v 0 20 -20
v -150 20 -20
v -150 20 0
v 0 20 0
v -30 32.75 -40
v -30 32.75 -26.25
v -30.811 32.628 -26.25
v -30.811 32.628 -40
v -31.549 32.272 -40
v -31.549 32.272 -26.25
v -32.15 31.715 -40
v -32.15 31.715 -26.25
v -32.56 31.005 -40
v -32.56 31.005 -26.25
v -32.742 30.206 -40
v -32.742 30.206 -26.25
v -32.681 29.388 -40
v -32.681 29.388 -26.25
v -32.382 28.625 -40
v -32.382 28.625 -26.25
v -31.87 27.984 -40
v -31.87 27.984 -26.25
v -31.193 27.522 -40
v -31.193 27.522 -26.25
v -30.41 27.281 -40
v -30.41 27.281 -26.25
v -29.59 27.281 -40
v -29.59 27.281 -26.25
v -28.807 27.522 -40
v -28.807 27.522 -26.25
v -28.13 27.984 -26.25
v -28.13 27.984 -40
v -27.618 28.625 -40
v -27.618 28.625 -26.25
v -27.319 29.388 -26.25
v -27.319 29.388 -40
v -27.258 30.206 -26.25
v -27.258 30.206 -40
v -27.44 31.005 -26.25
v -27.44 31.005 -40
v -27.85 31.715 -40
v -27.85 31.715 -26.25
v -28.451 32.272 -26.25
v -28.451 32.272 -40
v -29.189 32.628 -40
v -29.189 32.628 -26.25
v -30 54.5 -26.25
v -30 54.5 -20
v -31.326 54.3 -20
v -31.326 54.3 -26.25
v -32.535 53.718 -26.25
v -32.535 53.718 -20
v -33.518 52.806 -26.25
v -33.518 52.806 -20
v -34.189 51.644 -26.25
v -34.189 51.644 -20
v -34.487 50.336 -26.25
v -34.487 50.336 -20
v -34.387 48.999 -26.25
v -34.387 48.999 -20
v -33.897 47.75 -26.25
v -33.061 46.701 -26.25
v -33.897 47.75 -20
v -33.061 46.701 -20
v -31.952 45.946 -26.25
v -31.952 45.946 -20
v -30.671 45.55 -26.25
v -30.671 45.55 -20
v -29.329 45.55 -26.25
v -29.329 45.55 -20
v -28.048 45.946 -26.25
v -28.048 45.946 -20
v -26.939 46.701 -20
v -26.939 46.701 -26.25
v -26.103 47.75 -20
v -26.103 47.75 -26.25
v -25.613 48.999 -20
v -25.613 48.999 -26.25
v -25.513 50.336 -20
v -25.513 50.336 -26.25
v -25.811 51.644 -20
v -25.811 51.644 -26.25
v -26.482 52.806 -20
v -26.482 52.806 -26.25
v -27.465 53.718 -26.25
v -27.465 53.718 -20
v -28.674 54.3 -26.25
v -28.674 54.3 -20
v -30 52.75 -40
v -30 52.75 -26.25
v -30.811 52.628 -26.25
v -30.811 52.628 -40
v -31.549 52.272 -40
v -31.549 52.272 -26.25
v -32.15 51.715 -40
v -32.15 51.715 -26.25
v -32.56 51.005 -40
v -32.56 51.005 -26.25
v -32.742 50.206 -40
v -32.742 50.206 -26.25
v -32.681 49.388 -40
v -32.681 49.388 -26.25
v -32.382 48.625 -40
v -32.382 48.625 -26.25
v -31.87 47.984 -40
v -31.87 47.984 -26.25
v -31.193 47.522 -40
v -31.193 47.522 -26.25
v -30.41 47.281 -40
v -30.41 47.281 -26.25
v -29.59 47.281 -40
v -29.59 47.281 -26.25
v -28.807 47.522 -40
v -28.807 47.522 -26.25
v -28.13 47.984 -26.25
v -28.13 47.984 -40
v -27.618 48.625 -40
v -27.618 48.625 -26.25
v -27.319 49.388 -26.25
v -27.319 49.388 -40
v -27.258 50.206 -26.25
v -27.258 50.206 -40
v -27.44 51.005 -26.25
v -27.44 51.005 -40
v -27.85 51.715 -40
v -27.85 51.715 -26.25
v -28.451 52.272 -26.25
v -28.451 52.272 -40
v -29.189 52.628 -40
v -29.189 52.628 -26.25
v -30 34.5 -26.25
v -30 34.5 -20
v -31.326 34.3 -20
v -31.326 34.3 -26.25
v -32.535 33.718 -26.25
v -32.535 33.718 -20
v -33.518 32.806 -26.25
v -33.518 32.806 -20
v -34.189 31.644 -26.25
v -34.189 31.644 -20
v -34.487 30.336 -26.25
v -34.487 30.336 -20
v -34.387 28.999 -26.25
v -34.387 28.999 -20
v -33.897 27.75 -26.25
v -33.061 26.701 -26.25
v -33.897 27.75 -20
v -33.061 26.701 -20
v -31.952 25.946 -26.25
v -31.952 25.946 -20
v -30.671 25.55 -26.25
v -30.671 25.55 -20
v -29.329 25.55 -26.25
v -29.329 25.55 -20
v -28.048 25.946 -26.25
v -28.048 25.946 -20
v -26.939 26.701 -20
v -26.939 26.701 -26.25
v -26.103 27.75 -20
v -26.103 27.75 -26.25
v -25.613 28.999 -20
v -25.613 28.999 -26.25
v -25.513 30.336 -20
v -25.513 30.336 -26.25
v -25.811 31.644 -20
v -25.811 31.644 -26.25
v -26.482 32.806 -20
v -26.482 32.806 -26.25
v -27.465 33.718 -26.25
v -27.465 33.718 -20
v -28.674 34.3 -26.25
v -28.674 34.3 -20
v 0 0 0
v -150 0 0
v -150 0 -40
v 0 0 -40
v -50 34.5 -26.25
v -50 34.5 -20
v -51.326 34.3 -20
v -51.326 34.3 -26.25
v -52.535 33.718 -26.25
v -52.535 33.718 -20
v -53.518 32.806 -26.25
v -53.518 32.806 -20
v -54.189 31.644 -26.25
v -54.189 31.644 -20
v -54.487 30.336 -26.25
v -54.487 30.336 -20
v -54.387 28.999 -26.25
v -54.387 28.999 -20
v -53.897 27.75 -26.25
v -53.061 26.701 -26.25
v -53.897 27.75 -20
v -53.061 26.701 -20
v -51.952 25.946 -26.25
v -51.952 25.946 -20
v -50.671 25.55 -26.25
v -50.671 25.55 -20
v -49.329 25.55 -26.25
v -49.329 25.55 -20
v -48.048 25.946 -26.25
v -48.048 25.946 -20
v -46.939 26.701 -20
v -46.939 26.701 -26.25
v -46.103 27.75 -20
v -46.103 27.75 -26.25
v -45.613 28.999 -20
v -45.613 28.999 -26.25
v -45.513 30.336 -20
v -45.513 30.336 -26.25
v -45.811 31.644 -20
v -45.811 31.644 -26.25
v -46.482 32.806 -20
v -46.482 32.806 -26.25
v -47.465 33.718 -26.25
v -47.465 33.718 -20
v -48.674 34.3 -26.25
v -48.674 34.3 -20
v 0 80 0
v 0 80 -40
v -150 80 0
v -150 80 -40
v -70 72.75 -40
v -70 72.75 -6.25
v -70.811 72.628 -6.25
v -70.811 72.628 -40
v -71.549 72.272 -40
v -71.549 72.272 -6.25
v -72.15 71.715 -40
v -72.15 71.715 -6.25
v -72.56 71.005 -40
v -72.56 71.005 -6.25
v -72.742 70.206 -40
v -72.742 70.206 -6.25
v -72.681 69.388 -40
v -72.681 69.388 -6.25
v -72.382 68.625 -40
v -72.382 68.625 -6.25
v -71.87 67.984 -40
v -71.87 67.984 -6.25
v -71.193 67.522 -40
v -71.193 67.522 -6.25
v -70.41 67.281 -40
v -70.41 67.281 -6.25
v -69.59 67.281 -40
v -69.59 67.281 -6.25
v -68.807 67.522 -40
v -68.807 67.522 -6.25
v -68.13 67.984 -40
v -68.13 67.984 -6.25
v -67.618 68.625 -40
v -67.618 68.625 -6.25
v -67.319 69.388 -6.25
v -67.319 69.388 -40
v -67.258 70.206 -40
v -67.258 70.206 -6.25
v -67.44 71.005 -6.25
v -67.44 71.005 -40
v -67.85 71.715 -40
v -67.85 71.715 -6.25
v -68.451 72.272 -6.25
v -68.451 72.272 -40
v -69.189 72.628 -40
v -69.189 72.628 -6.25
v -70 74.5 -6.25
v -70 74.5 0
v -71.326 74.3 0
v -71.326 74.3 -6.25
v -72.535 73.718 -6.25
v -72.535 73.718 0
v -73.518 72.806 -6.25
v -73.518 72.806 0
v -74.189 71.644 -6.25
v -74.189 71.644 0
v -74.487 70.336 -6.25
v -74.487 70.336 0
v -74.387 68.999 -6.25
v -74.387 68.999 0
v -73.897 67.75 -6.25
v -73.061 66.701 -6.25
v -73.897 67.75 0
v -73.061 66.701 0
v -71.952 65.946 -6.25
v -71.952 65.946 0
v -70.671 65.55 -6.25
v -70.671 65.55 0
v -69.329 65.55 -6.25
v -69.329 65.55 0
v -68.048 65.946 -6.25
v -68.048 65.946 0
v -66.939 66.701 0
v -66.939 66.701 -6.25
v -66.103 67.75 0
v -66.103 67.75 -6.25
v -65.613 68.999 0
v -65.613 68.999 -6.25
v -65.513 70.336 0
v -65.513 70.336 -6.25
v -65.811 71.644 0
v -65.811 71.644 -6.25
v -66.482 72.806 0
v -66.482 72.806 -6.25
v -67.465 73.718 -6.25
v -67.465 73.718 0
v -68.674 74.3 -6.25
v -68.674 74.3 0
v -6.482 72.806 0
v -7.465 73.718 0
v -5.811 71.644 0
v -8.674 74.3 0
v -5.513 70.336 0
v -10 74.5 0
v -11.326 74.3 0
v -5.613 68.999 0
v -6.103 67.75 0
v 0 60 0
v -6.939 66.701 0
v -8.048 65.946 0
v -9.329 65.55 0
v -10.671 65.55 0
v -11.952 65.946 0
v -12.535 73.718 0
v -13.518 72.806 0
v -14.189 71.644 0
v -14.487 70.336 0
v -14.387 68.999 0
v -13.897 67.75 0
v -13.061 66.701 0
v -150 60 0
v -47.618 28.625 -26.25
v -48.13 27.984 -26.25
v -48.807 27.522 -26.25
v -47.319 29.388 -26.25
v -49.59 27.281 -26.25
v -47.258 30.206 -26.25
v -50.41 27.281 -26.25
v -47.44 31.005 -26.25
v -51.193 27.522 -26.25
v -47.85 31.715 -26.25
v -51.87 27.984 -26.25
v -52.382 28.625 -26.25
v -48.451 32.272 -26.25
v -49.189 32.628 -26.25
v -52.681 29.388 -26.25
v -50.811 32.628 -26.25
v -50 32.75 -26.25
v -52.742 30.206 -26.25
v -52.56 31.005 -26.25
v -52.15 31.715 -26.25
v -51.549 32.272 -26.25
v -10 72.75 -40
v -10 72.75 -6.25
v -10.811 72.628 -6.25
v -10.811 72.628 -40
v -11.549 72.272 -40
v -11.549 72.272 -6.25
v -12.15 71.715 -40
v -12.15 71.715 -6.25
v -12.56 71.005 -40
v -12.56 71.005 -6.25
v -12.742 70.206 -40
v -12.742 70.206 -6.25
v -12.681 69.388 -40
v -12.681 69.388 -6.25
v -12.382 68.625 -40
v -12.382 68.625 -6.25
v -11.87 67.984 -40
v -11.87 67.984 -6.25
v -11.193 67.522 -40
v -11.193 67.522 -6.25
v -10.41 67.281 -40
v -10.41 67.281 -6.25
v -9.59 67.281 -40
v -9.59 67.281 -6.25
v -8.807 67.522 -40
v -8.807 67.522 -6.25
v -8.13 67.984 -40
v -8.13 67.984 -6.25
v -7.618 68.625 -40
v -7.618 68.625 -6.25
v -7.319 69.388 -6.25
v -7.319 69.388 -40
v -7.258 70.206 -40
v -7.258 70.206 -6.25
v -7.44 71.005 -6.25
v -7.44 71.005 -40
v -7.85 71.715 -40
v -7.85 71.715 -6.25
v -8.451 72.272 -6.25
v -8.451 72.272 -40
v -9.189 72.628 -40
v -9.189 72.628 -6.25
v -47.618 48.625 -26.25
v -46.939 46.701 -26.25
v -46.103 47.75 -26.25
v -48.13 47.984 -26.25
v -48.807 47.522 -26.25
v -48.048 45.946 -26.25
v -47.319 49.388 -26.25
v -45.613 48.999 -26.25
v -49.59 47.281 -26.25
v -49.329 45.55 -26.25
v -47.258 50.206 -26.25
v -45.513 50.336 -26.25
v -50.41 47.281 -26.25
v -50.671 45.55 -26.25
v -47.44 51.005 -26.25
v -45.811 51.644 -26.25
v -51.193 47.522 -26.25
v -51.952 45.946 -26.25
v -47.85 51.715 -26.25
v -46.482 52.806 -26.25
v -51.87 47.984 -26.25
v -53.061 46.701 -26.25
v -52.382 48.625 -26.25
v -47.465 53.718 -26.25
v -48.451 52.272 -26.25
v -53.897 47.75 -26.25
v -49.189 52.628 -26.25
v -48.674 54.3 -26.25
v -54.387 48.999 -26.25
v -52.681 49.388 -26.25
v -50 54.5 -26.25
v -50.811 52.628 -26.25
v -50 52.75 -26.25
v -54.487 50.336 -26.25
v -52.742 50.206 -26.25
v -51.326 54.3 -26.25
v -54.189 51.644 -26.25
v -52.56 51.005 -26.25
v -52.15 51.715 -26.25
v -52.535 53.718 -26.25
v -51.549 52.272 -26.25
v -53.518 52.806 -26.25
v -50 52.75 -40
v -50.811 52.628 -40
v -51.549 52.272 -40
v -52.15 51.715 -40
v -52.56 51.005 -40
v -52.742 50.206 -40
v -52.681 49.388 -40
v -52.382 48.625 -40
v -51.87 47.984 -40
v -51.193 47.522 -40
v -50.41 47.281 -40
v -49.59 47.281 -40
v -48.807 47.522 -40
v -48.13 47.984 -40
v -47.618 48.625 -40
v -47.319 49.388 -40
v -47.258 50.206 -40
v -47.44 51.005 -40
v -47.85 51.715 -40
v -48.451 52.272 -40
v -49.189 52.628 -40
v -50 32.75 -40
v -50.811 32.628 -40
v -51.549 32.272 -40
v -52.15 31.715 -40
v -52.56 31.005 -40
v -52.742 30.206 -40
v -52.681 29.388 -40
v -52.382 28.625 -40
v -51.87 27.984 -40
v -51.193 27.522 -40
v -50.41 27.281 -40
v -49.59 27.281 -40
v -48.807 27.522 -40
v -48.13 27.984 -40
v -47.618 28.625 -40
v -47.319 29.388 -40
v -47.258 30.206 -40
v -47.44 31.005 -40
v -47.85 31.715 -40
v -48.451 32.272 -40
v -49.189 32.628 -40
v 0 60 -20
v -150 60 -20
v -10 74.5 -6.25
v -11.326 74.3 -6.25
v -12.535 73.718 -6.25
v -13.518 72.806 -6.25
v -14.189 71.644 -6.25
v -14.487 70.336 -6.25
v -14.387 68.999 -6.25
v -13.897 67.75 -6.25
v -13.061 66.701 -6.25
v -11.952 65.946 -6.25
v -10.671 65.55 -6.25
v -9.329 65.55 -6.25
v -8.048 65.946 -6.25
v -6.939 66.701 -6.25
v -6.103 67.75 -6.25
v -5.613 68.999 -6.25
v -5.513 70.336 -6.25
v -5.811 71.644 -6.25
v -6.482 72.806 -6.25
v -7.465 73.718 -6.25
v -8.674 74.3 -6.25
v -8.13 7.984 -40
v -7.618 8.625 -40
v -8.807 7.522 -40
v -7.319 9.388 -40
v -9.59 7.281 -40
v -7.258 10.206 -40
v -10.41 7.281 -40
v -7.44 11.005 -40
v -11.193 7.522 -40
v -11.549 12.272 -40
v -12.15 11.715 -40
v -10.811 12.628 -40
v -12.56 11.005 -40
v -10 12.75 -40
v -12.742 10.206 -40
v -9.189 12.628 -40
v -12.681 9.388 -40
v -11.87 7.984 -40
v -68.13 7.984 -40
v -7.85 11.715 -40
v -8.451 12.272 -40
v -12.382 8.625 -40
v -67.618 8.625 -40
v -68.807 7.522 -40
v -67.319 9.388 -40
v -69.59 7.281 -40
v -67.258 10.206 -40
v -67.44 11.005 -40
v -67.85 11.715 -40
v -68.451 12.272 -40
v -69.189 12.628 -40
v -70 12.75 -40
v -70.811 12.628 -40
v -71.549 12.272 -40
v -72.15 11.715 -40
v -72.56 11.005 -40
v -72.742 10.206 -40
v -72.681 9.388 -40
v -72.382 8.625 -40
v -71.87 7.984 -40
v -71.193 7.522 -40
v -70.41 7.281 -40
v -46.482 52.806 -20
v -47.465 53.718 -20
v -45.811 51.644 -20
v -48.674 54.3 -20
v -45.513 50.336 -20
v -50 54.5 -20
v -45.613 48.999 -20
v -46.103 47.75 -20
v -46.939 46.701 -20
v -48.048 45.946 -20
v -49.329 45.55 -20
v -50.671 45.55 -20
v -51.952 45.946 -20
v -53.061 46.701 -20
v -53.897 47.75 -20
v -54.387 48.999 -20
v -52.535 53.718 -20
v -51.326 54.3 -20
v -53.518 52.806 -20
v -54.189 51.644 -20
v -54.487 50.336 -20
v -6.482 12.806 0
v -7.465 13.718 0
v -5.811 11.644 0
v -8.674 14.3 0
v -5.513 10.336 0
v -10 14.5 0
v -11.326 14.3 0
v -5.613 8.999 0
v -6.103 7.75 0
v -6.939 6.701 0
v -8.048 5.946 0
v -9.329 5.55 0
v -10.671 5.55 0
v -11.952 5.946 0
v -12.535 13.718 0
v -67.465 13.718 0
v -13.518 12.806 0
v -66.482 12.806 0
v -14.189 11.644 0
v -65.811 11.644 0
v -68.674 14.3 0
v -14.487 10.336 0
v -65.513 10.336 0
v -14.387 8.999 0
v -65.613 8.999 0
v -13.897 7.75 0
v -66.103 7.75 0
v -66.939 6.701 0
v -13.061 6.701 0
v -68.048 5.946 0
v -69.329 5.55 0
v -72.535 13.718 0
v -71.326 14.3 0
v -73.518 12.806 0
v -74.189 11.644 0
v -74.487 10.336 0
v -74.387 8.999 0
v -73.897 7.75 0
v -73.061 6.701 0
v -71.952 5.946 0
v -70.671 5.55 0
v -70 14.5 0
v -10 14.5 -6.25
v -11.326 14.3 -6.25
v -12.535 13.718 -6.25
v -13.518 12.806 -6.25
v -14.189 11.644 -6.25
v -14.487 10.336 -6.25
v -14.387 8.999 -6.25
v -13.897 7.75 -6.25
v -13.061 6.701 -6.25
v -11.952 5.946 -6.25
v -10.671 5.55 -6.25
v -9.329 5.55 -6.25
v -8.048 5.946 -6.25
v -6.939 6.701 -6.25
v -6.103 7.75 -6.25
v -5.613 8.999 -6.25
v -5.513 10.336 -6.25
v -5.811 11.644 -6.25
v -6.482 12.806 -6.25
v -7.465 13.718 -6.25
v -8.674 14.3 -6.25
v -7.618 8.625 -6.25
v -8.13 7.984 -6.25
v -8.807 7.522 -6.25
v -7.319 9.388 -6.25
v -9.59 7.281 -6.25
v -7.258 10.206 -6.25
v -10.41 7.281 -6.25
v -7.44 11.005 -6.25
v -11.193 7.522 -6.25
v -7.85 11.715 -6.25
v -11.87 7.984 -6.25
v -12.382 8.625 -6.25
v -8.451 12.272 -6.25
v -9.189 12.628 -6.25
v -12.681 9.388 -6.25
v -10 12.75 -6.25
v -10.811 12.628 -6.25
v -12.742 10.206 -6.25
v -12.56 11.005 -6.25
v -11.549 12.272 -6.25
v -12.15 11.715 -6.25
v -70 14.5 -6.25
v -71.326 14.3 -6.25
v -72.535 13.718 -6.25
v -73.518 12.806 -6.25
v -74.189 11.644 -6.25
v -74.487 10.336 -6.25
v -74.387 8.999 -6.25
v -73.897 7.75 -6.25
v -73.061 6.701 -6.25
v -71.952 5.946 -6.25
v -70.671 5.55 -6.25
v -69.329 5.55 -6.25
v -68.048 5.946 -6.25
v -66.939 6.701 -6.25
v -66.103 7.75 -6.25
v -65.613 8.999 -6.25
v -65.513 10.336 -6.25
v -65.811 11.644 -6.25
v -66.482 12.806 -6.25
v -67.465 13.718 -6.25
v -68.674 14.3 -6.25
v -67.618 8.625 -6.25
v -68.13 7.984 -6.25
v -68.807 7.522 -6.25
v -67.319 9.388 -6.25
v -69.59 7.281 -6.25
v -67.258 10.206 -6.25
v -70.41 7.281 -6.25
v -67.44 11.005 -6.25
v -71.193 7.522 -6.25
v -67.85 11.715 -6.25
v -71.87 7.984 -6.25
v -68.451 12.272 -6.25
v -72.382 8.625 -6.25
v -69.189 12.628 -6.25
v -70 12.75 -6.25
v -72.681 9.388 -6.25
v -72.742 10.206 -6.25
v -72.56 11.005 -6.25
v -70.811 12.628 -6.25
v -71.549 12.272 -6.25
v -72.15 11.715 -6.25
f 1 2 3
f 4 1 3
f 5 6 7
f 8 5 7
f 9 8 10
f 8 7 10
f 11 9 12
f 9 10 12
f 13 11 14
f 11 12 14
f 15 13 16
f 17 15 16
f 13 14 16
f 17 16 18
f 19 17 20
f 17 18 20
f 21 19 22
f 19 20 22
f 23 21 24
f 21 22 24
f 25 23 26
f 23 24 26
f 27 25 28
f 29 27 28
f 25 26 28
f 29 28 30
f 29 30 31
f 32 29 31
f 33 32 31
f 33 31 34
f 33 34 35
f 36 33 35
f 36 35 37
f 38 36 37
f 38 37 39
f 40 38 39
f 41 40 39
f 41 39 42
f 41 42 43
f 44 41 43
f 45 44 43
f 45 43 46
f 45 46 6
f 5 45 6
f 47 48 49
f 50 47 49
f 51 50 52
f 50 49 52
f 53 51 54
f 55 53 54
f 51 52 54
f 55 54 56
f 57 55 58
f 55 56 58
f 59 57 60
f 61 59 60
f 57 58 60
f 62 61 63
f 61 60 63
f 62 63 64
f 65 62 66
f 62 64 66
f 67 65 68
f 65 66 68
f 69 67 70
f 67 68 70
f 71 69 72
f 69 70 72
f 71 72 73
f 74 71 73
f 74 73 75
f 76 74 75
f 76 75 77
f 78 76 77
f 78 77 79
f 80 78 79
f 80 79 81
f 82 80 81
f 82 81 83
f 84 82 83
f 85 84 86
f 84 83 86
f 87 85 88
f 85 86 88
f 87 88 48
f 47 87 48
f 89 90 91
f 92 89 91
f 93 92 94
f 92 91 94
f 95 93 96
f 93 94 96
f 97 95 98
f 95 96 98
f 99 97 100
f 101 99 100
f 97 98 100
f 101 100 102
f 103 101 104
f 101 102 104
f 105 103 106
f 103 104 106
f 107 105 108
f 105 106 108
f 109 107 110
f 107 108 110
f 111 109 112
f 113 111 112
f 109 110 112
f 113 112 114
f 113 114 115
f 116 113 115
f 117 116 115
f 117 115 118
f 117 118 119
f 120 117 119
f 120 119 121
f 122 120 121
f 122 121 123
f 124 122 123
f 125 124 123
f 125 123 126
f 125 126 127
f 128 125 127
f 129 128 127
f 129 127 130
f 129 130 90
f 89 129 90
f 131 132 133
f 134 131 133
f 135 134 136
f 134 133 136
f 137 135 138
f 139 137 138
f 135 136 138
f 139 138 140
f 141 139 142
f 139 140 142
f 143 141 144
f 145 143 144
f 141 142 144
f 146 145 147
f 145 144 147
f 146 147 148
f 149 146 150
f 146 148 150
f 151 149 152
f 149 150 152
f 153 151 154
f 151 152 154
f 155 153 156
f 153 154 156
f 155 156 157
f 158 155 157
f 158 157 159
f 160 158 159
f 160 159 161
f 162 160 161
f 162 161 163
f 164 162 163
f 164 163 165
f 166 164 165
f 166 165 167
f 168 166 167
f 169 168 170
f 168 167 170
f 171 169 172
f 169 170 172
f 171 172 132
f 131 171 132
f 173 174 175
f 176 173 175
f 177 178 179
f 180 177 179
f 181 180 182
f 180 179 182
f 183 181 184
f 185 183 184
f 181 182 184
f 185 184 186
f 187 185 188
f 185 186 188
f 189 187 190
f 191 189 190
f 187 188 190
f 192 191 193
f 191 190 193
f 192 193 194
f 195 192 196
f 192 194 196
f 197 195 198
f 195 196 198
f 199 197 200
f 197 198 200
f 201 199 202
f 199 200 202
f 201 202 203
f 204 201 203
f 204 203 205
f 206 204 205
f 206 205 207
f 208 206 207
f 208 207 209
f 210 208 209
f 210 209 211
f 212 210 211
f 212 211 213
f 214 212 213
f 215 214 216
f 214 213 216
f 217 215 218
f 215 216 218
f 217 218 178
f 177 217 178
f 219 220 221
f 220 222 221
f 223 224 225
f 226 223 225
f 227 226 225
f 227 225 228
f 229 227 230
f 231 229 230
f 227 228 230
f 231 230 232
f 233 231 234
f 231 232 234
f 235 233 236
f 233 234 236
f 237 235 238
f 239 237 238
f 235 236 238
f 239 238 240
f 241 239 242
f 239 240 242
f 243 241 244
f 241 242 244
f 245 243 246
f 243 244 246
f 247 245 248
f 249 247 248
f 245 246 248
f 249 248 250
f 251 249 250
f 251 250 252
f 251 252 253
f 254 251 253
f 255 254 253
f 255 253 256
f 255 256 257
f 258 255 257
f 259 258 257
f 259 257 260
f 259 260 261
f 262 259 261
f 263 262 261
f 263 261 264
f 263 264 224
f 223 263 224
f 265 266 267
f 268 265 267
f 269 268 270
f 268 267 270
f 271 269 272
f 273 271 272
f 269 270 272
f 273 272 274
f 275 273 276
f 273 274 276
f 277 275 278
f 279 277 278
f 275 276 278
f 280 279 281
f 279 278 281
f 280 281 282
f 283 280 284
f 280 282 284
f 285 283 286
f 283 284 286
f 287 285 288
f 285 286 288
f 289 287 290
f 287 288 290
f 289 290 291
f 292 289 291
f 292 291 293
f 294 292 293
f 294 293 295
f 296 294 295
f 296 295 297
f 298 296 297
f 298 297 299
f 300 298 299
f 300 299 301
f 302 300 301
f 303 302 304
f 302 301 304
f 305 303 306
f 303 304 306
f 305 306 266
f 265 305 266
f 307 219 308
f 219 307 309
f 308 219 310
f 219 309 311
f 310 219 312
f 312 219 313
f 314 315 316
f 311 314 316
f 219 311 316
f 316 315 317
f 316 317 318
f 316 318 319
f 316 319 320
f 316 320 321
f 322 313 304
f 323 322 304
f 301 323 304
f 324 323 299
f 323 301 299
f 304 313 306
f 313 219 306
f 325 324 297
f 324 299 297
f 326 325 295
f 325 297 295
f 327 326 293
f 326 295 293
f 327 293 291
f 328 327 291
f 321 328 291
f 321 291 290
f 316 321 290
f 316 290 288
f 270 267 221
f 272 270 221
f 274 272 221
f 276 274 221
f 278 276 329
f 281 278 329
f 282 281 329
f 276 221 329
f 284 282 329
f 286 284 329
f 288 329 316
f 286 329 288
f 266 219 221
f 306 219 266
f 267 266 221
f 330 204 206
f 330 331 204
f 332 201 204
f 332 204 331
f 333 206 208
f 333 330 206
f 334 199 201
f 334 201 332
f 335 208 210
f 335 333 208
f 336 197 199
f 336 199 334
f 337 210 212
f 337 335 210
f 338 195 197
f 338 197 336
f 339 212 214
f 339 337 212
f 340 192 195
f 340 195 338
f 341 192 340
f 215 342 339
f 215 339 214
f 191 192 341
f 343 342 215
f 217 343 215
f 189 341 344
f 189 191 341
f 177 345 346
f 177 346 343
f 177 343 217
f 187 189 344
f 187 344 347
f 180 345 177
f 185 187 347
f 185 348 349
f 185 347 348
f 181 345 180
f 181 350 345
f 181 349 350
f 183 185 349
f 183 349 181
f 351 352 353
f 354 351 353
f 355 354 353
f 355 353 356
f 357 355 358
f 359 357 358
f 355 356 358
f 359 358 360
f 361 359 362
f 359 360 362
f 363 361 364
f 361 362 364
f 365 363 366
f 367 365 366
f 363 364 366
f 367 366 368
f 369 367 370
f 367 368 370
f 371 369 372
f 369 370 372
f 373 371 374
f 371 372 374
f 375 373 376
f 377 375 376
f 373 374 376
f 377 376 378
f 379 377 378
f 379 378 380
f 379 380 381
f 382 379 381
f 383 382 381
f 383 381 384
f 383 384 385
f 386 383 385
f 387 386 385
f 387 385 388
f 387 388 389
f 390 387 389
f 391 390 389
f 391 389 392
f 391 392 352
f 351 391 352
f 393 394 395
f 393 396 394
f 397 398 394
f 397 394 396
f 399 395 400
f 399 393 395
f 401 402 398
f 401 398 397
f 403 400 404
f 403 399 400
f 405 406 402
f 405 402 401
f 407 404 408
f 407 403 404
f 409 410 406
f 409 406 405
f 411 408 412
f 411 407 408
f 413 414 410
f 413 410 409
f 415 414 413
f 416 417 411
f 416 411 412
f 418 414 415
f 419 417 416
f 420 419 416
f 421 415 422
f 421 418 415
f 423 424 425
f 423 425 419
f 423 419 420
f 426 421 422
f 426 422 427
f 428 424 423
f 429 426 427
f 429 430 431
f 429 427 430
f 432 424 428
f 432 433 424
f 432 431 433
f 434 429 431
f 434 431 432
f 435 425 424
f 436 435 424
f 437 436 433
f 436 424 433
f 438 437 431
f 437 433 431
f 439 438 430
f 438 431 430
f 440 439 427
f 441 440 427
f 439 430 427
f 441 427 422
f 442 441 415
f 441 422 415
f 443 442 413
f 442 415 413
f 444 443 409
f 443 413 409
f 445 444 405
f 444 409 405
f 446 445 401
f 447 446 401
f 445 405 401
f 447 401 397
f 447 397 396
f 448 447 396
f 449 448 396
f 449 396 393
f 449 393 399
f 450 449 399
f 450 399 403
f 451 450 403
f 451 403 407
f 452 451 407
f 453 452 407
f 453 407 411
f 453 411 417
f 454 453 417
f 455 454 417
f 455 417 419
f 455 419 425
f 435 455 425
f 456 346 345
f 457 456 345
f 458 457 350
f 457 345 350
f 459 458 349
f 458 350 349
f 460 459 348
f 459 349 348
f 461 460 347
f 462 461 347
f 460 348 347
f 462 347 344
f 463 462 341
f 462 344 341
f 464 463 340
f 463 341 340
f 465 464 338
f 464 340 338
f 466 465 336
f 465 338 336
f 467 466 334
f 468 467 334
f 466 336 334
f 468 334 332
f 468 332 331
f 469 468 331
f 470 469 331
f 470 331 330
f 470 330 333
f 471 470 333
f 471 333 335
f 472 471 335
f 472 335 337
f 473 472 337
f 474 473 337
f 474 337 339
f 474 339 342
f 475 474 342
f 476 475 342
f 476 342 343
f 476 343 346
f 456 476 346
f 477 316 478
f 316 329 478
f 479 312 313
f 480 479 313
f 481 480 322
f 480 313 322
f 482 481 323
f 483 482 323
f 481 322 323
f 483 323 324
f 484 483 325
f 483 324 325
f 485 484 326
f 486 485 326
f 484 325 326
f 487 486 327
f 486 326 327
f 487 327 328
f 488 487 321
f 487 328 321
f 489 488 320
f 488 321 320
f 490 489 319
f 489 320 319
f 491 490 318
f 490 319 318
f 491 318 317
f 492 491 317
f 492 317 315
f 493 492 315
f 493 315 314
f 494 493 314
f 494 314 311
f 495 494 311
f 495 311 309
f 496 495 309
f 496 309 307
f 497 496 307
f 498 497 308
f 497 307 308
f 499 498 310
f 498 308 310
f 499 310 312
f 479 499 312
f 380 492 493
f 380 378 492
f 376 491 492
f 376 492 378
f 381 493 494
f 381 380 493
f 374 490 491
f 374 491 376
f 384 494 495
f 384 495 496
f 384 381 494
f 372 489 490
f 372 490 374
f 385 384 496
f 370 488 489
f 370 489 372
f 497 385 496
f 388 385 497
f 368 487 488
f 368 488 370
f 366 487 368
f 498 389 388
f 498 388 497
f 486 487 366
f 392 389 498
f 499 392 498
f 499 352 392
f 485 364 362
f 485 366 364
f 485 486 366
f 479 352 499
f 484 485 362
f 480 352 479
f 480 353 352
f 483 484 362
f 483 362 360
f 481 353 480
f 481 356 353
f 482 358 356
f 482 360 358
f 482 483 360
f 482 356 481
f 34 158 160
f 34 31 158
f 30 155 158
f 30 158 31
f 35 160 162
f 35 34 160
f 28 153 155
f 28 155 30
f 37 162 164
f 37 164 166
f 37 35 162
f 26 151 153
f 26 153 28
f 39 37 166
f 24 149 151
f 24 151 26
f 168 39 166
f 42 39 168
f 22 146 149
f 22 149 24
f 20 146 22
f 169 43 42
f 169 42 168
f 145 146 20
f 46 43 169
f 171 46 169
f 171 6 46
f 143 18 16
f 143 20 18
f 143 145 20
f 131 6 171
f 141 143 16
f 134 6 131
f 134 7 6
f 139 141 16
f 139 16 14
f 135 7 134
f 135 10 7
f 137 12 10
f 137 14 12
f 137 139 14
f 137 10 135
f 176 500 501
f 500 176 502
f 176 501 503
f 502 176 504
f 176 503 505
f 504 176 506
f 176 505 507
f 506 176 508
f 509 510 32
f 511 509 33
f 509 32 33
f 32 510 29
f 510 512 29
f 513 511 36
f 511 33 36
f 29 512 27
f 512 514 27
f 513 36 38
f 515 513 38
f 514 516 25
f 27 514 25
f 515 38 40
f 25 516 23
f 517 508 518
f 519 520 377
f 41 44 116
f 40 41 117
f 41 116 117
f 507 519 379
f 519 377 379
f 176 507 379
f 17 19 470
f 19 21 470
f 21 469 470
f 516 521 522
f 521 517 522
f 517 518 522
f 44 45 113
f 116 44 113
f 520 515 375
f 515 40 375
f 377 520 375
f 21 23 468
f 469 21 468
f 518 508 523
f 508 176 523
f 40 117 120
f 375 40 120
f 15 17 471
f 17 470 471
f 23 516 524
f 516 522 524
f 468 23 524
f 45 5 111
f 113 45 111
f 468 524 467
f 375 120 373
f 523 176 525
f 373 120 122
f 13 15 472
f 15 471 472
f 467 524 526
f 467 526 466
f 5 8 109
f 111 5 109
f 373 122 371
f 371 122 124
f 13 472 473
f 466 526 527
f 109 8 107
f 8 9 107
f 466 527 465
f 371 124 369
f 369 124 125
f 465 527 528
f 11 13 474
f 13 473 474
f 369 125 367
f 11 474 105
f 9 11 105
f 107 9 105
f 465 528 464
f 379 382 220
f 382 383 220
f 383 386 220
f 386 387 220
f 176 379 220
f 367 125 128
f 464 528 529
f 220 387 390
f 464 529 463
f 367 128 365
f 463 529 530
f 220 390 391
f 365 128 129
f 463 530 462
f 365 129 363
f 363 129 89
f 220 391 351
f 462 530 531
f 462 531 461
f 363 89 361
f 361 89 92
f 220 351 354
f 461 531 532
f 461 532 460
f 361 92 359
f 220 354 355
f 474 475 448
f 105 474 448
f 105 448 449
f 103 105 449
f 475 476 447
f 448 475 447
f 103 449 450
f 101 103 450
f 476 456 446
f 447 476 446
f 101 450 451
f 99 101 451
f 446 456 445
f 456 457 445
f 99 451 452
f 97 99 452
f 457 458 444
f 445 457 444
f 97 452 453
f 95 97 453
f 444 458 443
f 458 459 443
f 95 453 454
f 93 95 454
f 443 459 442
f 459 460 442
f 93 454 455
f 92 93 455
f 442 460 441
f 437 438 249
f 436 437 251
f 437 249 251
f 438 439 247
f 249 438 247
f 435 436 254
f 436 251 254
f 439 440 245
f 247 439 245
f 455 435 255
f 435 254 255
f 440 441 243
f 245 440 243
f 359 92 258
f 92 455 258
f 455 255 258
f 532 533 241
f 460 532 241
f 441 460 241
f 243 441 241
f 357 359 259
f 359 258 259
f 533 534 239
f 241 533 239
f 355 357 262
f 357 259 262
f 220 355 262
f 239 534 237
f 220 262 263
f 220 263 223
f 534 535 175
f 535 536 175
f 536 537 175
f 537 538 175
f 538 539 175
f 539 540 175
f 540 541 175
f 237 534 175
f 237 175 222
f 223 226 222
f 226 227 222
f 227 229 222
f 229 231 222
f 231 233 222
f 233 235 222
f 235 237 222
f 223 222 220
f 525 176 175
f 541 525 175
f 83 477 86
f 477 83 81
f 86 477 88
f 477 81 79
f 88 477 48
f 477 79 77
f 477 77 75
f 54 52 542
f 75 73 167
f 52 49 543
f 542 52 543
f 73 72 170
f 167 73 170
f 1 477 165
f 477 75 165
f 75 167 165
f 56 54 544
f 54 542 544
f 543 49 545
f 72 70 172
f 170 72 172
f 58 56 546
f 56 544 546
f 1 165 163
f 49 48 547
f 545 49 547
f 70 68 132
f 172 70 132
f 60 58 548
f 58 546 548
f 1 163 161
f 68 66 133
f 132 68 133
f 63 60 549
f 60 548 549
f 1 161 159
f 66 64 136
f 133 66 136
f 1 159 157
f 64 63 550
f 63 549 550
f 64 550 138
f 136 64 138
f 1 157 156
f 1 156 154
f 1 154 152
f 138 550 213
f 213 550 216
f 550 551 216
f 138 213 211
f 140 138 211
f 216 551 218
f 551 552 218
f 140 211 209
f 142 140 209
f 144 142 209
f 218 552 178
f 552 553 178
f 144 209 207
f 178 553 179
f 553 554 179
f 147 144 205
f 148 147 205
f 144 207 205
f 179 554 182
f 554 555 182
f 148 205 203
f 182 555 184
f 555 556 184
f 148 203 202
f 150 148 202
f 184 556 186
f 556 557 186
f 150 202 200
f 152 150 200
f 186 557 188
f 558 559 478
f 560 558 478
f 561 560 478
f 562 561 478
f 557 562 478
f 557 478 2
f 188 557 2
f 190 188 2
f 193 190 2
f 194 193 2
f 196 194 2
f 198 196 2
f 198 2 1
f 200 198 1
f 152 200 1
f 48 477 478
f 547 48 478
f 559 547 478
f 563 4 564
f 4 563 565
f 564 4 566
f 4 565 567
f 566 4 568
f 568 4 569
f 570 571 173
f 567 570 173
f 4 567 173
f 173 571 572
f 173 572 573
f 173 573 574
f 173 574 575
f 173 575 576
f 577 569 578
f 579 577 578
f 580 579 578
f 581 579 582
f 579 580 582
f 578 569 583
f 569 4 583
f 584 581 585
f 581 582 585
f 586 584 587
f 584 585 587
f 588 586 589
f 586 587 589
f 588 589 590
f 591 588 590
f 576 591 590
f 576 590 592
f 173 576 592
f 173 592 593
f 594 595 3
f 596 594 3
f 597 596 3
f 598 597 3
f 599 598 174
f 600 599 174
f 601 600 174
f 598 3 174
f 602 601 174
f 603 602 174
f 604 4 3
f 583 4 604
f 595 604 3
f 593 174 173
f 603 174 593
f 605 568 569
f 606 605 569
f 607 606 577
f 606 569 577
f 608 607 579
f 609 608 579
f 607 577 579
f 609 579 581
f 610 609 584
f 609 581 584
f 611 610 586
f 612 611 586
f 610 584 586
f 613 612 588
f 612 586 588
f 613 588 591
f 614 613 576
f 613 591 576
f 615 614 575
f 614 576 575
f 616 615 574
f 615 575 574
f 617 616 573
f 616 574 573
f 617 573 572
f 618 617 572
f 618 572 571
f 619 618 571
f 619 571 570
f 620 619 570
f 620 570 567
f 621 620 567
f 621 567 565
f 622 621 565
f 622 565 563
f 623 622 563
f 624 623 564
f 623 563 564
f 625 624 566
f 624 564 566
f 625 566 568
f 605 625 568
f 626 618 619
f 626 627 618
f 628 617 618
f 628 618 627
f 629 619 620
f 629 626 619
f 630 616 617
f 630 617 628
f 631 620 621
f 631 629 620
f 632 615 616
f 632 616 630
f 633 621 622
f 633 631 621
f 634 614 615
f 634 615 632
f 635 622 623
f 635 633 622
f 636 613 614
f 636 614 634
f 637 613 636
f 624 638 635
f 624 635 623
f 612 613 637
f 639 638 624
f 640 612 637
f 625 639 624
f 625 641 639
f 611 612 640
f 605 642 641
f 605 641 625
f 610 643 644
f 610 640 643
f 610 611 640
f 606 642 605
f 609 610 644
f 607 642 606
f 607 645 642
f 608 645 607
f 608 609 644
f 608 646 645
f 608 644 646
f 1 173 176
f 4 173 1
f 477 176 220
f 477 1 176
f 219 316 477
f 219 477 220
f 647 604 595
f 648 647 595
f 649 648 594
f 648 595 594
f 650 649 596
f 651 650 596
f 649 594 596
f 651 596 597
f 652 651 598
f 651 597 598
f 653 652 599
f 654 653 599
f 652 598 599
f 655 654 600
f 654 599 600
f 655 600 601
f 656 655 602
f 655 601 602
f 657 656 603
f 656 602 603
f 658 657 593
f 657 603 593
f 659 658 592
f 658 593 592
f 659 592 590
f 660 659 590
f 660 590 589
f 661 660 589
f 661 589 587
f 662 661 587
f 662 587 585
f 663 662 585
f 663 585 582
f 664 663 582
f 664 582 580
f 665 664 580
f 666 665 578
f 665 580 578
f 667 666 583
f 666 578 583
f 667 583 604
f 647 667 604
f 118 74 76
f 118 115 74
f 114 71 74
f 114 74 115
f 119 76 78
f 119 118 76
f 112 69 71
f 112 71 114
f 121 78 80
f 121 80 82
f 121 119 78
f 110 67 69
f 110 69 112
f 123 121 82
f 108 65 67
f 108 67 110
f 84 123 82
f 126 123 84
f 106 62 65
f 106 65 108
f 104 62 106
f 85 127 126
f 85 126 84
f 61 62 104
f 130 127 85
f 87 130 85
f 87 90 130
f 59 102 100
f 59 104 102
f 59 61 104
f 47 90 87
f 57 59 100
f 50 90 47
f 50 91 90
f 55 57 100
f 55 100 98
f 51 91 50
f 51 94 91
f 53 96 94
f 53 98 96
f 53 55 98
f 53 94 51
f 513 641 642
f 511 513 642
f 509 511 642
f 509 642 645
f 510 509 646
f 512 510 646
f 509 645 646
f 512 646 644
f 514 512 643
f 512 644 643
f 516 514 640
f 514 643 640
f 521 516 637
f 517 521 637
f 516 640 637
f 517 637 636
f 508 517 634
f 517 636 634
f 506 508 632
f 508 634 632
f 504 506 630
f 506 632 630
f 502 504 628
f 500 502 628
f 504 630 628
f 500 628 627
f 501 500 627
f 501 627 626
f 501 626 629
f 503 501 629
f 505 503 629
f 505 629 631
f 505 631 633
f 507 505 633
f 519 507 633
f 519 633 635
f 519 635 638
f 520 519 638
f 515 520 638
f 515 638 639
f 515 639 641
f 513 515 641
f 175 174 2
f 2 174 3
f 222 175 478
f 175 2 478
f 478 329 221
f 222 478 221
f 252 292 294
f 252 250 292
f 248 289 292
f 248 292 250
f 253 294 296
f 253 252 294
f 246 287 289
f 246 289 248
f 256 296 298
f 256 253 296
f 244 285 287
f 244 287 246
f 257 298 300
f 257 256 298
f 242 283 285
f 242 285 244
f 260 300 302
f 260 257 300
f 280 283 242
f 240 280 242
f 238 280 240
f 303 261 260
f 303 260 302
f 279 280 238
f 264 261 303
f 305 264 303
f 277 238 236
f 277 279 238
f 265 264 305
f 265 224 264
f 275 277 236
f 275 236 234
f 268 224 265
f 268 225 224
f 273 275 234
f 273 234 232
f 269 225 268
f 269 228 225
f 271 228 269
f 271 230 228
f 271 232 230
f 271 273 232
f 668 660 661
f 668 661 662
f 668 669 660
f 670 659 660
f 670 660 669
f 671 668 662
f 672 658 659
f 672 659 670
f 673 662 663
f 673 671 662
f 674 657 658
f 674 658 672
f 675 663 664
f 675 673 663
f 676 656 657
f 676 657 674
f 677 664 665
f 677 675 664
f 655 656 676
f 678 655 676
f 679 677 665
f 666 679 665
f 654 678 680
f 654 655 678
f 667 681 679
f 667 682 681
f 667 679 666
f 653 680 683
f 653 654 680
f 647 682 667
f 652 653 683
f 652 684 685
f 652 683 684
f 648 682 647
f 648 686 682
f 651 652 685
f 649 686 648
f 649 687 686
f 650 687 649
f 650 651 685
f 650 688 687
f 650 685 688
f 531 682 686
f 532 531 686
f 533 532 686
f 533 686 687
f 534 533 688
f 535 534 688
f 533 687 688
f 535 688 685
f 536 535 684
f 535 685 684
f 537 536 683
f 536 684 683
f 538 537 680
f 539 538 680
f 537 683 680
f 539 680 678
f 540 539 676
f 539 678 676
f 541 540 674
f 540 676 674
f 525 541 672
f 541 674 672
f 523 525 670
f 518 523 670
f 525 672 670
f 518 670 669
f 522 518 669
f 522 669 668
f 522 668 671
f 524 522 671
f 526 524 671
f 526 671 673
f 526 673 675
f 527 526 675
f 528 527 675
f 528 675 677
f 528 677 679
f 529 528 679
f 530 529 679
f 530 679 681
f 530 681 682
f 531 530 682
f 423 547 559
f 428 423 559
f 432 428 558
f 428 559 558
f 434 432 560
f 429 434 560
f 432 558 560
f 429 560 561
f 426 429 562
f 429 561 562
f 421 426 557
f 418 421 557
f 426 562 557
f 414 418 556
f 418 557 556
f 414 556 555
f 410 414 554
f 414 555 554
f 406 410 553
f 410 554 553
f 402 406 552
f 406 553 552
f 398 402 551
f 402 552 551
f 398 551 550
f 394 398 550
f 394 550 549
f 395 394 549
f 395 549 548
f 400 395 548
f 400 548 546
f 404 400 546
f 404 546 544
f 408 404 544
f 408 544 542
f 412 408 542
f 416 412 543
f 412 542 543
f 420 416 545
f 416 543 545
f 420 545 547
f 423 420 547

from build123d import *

# Parameters (mm, degrees)
PAD_DEPTH             = 75
SKETCH001_R           = 2.75
POCKET_DEPTH          = 40.001
SKETCH002_R           = 4.5
POCKET001_DEPTH       = 6.25
SKETCH003_R           = 4.5
POCKET002_DEPTH       = 6.25
CLONE_PLACEMENT_ANGLE = 270


with BuildPart() as part:
    # Sketch → Pad (new body, symmetric)
    with BuildSketch(Plane.XZ):
        Polygon((40, 0), (40, -40), (-40, -40), (-40, 0), (-20, 0), (-20, -20), (20, -20), (20, 0), align=None)
    extrude(amount=PAD_DEPTH, both=True)

    # Sketch001 (on Face4 of Pad) → Pocket (cut, through all)
    with BuildSketch(Plane(origin=(0, 0, 0), x_dir=(-1, 0, 0), z_dir=(0, 0, 1))):
        with Locations((-30, -65)):
            Circle(SKETCH001_R)
        with Locations((30, -65)):
            Circle(SKETCH001_R)
        with Locations((-30, -5)):
            Circle(SKETCH001_R)
        with Locations((30, -5)):
            Circle(SKETCH001_R)
        with Locations((-10, -25)):
            Circle(SKETCH001_R)
        with Locations((10, -25)):
            Circle(SKETCH001_R)
        with Locations((-10, -45)):
            Circle(SKETCH001_R)
        with Locations((10, -45)):
            Circle(SKETCH001_R)
    extrude(amount=-POCKET_DEPTH, mode=Mode.SUBTRACT)

    # Sketch002 (on Face16 of Pocket) → Pocket001 (cut)
    with BuildSketch(Plane(origin=(0, 0, 0), x_dir=(-1, 0, 0), z_dir=(0, 0, 1))):
        with Locations((-30, -65)):
            Circle(SKETCH002_R)
        with Locations((-30, -5)):
            Circle(SKETCH002_R)
        with Locations((30, -5)):
            Circle(SKETCH002_R)
        with Locations((30, -65)):
            Circle(SKETCH002_R)
    extrude(amount=-POCKET001_DEPTH, mode=Mode.SUBTRACT)

    # Sketch003 (on Face20 of Pocket001) → Pocket002 (cut)
    with BuildSketch(Plane(origin=(0, 0, -20), x_dir=(-1, 0, 0), z_dir=(0, 0, 1))):
        with Locations((-10, -45)):
            Circle(SKETCH003_R)
        with Locations((-10, -25)):
            Circle(SKETCH003_R)
        with Locations((10, -25)):
            Circle(SKETCH003_R)
        with Locations((10, -45)):
            Circle(SKETCH003_R)
    extrude(amount=-POCKET002_DEPTH, mode=Mode.SUBTRACT)


with BuildPart() as part_1:
    # Clone placement: moved
    add(part.part.moved(Location((-75, 40, 0))).rotate(Axis((-75, 40, 0), (0, 0, 1)), CLONE_PLACEMENT_ANGLE))


solid = part_1.part
